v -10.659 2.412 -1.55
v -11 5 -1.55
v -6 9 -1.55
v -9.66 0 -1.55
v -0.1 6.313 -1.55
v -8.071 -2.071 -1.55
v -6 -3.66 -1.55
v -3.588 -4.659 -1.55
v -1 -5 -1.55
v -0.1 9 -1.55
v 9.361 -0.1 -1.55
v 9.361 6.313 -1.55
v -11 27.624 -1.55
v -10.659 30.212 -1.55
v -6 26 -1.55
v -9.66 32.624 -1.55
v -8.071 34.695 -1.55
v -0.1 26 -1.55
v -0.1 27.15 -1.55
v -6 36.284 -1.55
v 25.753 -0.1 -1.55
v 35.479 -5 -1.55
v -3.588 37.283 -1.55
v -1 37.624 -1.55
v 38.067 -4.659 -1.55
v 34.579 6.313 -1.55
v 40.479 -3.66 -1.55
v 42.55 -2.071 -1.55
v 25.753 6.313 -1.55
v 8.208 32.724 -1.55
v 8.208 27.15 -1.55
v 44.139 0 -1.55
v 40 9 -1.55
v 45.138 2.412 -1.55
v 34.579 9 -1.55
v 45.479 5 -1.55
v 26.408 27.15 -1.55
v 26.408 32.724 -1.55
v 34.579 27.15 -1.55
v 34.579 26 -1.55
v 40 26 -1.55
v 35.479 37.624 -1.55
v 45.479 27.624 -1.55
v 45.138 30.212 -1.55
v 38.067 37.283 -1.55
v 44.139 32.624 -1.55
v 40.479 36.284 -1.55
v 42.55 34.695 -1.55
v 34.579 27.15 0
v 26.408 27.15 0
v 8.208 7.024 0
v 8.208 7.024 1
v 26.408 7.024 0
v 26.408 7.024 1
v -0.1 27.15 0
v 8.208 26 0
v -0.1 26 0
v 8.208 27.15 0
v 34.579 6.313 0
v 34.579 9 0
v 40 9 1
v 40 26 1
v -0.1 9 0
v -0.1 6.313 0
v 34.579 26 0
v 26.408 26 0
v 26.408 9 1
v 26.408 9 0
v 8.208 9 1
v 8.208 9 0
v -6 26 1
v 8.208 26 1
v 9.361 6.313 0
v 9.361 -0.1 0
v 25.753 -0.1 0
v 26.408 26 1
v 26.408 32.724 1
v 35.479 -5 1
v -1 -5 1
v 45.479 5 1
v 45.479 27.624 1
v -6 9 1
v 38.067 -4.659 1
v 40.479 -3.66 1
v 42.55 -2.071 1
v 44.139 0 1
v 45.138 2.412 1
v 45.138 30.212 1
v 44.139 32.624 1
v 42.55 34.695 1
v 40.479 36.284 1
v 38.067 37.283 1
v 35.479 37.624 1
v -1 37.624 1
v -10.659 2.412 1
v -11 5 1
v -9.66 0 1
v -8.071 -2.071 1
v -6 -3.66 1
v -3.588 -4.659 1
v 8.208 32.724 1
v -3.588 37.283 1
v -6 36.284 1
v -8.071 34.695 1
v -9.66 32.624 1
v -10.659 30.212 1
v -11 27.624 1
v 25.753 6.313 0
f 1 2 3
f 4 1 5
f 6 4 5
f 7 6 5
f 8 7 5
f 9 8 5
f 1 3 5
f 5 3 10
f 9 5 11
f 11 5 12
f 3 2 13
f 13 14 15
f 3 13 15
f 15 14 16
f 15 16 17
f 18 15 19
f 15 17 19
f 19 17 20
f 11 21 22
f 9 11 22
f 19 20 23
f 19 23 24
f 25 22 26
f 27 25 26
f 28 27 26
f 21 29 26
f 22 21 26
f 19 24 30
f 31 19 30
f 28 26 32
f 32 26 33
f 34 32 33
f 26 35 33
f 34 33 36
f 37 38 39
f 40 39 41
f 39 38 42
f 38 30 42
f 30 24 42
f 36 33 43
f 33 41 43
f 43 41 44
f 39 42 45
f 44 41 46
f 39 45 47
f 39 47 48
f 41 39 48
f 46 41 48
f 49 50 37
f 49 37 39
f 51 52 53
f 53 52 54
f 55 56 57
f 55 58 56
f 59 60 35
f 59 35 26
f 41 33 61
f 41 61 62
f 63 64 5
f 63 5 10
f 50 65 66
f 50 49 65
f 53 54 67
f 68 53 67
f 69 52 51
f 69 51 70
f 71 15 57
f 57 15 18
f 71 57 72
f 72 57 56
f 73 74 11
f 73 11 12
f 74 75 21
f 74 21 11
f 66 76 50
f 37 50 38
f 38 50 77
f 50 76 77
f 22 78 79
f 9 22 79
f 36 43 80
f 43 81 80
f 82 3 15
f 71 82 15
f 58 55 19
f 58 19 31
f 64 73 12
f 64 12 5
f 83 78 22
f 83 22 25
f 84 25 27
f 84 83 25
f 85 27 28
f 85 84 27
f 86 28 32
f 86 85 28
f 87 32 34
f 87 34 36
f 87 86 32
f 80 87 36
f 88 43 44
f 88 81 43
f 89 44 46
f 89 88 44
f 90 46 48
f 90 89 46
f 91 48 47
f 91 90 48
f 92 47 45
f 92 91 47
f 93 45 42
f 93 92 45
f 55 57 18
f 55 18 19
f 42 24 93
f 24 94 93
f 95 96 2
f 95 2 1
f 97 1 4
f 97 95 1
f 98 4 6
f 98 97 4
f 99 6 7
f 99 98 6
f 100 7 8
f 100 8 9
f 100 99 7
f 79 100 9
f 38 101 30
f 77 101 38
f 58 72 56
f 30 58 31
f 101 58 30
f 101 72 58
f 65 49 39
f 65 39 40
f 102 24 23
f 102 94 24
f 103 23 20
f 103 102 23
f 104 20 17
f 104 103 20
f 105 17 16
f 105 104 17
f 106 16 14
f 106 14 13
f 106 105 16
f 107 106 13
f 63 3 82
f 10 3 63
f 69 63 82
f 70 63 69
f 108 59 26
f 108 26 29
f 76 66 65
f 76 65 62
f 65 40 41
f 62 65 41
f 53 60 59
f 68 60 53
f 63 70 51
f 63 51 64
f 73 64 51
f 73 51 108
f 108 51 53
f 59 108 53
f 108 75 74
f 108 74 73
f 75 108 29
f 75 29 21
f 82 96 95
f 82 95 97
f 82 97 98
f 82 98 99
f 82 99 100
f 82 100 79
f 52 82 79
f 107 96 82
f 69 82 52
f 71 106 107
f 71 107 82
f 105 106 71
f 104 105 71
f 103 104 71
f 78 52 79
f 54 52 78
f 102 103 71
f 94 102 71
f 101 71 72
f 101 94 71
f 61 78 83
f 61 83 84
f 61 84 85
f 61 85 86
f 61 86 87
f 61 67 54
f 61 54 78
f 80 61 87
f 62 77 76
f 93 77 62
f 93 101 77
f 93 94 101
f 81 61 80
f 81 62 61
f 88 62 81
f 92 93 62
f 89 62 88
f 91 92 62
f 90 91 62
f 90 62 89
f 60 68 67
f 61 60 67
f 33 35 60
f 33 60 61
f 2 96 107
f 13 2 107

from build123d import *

# Parameters (mm, degrees)
EXTRUDE001_DEPTH      = 4
BOX001_W              = 46
BOX001_H              = 17
BOX001_DEPTH          = 10
SKETCH001_W           = 18.2
SKETCH001_H           = 25.7
EXTRUDE_DEPTH         = 10
EXTRUDE002_DEPTH      = 1
EXTRUDE002_DEPTH_BACK = 1.55


with BuildPart() as bottomboard:
    # Sketch002 → Extrude001 (new body)
    with BuildSketch(Plane.XY):
        Polygon((-0.1, 27.15), (34.579, 27.15), (34.579, 6.313), (25.753, 6.313), (25.753, -0.1), (9.361, -0.1), (9.361, 6.313), (-0.1, 6.313), align=None)
    extrude(amount=-EXTRUDE001_DEPTH)


with BuildPart() as solderingkeepout:
    # Box001 → Box001 (new body)
    with BuildSketch(Plane(origin=(-6, 9, -5), x_dir=(1, 0, 0), z_dir=(0, 0, 1))):
        with Locations((23, 8.5)):
            Rectangle(BOX001_W, BOX001_H)
    extrude(amount=BOX001_DEPTH)


with BuildPart() as cutouts:
    # Sketch001 → Extrude (new body, symmetric)
    with BuildSketch(Plane.XY):
        with Locations((17.308148, 19.873965)):
            Rectangle(SKETCH001_W, SKETCH001_H)
    extrude(amount=EXTRUDE_DEPTH, both=True)

    # Fusion: union bottomBoard, solderingKeepout
    add(bottomboard.part)
    add(solderingkeepout.part)


with BuildPart() as mateplate:
    # Sketch003 → Extrude002 (new body, two sides)
    with BuildSketch(Plane.XY) as extrude002_sk:
        with BuildLine():
            ThreePointArc((-1, 37.623965), (-8.071068, 34.695033), (-11, 27.623965))
            Line((-11, 5), (-11, 27.623965))
            ThreePointArc((-11, 5), (-8.071068, -2.071068), (-1, -5))
            Line((35.479, -5), (-1, -5))
            ThreePointArc((35.479, -5), (42.550068, -2.071068), (45.479, 5))
            Line((45.479, 27.623965), (45.479, 5))
            ThreePointArc((45.479, 27.623965), (42.550068, 34.695033), (35.479, 37.623965))
            Line((-1, 37.623965), (35.479, 37.623965))
        make_face()
    extrude(amount=EXTRUDE002_DEPTH)
    extrude(extrude002_sk.sketch, amount=-EXTRUDE002_DEPTH_BACK)

    # Cut: cut CutOuts
    add(cutouts.part, mode=Mode.SUBTRACT)


solid = mateplate.part
